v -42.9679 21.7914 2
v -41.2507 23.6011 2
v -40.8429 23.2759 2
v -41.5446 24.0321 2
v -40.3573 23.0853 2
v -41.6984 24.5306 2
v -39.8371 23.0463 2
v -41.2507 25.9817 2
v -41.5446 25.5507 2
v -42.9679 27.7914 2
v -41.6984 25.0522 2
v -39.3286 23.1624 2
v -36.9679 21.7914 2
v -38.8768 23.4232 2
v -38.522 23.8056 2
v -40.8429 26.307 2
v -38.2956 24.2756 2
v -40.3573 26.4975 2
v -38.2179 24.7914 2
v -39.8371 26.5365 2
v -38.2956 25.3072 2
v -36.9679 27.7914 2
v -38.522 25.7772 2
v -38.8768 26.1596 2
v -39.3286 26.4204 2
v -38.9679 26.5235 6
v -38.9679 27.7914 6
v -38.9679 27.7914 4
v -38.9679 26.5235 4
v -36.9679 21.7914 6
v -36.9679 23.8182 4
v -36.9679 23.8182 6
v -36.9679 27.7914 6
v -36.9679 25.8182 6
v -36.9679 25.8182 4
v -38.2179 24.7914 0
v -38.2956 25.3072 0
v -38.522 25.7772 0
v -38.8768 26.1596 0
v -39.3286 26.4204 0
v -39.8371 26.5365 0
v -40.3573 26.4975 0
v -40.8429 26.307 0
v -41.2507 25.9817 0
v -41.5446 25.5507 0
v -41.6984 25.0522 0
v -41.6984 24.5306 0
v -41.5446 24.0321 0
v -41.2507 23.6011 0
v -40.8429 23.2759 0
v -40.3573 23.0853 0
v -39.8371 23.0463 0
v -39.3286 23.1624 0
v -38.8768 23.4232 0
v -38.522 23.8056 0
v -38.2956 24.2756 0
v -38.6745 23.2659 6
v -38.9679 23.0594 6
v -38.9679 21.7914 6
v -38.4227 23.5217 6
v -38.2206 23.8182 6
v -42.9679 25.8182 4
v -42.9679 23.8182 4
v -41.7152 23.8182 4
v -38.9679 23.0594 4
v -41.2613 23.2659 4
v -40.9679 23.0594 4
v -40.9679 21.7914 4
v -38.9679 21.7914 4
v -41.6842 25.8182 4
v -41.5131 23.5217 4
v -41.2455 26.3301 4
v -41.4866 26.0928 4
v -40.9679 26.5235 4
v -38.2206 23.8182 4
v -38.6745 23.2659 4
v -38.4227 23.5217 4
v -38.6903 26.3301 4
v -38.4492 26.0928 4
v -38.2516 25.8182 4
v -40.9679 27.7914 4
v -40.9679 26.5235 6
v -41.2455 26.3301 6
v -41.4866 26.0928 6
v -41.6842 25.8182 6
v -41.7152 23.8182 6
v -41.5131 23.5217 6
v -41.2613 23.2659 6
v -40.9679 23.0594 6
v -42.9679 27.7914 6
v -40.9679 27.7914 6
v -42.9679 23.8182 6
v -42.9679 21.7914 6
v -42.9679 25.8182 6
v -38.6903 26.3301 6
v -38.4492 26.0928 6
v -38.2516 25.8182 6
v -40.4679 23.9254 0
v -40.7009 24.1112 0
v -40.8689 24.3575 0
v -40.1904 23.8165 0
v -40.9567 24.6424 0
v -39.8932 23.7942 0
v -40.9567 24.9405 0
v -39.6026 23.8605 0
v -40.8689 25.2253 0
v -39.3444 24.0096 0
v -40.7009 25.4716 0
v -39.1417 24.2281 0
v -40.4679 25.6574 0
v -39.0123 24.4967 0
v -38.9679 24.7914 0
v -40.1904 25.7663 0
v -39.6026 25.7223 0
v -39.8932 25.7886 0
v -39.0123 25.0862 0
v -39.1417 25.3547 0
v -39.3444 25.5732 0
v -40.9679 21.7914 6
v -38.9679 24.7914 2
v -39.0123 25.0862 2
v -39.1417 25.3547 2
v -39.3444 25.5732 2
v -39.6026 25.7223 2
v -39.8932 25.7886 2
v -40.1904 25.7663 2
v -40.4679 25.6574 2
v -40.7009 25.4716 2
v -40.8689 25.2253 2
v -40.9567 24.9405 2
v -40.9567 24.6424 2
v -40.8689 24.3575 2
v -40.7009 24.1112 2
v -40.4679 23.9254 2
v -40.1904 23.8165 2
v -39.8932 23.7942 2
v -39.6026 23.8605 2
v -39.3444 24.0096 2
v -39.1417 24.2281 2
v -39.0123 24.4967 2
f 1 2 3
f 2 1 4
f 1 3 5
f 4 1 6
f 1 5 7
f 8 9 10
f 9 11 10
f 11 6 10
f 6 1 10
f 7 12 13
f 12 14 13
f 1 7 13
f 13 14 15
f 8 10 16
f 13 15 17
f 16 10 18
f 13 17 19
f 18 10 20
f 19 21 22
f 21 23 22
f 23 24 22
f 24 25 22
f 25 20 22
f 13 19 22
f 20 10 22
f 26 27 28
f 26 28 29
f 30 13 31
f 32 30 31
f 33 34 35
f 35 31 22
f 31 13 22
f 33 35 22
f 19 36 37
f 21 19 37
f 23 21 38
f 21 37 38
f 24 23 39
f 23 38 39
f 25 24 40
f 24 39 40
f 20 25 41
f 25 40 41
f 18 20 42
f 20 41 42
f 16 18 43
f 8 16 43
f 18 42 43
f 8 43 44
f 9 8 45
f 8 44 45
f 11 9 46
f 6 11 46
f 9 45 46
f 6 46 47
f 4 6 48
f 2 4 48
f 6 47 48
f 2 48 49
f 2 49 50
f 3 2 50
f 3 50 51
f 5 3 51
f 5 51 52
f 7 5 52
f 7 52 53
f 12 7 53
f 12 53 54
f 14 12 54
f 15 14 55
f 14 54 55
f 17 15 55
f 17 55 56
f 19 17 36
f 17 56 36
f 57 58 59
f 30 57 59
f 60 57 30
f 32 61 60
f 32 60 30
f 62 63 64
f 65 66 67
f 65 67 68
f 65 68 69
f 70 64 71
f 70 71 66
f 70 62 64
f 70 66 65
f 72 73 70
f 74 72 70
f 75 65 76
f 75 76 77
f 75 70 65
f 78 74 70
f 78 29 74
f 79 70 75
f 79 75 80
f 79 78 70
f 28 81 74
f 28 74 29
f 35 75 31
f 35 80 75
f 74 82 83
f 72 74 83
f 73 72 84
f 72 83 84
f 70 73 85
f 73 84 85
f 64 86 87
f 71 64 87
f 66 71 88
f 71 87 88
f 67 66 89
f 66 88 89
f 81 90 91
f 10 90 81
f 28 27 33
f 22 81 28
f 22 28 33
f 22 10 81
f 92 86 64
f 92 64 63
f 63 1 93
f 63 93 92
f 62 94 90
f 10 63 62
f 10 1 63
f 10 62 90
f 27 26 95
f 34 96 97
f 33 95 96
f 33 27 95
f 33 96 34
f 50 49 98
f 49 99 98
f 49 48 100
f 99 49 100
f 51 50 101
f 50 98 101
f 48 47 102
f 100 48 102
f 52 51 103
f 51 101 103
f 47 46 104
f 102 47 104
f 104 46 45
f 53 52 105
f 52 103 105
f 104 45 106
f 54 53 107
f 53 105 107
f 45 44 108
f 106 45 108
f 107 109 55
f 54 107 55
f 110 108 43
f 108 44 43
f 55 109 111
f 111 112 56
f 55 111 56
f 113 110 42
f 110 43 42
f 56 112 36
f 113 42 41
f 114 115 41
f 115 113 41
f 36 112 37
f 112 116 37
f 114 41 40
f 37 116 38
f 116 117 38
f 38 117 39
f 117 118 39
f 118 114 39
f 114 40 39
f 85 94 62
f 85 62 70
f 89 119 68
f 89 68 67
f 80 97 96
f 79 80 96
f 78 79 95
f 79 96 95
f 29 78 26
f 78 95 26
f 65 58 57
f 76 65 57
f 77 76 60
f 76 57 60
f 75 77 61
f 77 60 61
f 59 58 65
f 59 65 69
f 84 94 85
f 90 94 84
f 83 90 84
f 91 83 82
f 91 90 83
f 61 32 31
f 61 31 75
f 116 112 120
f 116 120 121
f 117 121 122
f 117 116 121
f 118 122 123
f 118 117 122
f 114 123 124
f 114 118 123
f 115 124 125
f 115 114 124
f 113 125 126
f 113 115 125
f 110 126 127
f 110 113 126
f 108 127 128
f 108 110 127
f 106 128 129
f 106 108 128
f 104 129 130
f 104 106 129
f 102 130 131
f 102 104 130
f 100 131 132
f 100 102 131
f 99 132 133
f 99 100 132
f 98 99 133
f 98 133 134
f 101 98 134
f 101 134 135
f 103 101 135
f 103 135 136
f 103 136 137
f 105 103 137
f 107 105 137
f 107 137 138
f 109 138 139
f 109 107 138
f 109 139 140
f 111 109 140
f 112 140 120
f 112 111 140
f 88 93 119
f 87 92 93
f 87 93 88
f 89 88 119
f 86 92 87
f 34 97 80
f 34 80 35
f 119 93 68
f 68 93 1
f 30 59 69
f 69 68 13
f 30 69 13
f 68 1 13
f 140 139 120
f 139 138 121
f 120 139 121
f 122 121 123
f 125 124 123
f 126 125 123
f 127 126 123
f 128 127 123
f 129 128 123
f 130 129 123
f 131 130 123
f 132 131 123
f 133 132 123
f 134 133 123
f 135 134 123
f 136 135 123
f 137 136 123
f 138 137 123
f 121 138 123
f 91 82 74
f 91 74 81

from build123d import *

# Parameters (mm, degrees)
SKETCH1_R           = 1.75
SKETCH1_R_2         = 1
BOSS_EXTRUDE1_DEPTH = 2
SKETCH4_W           = 6
SKETCH4_H           = 6
BOSS_EXTRUDE2_DEPTH = 4
SKETCH5_R           = 2
CUT_EXTRUDE4_DEPTH  = 2


with BuildPart() as part:
    # Sketch1 → Boss-Extrude1 (new body)
    with BuildSketch(Plane.XY):
        with Locations((-39.967897534, 24.79140814)):
            Circle(SKETCH1_R)
        with Locations((-39.967897534, 24.79140814)):
            Circle(SKETCH1_R_2, mode=Mode.SUBTRACT)
    extrude(amount=BOSS_EXTRUDE1_DEPTH)

    # Sketch4 → Boss-Extrude2 (add)
    with BuildSketch(Plane.XY.offset(2)):
        with Locations((-39.967897534, 24.79140814)):
            Rectangle(SKETCH4_W, SKETCH4_H)
    extrude(amount=BOSS_EXTRUDE2_DEPTH)

    # Sketch5 → Cut-Extrude4 (cut)
    with BuildSketch(Plane.XY.offset(6)):
        with Locations((-39.967897534, 24.79140814)):
            Circle(SKETCH5_R)
        Polygon((-36.967897534, 25.818240491), (-36.967897534, 23.818240491), (-39.967897534, 23.818240491), (-42.967897534, 23.818240491), (-42.967897534, 25.818240491), (-39.967897534, 25.818240491), align=None)
        Polygon((-40.967897534, 24.79140814), (-40.967897534, 27.79140814), (-38.967897534, 27.79140814), (-38.967897534, 24.79140814), (-38.967897534, 21.79140814), (-40.967897534, 21.79140814), align=None)
    extrude(amount=-CUT_EXTRUDE4_DEPTH, mode=Mode.SUBTRACT)


solid = part.part
